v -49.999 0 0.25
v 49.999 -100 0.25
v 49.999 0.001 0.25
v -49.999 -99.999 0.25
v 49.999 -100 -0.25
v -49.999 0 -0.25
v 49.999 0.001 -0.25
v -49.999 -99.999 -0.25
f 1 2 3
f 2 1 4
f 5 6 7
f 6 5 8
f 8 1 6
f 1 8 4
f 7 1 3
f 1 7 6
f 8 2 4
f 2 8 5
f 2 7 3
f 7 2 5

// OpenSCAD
bend_ake630_radius = 0.0005;
bend_ake630_width = 0.630;
thickness = 0.001;

/// Rauminhalt, der mit der AKE 630 festgehalten wird.
/// Möglichst simpel.
module bend_ake630_clampspace()
{
	translate([-0.1, 0, 0])
	cube(size=[0.2, bend_ake630_width, 0.1], center=true);
};

module bend_ake630_clamp_bar()
{
	rotate(90, [1, 0, 0])
	linear_extrude(height=bend_ake630_width, center=true)
	polygon(
		points=[
			[-0.000, 0.000], // eigentliche biegekante
			[-0.005, 0.007], // kante nach der schräge
			[-0.010, 0.007], // bis zur schweißnaht
			[-0.043, 0.045], // kante hinten oben
			[-0.043, 0.000] // kante hinten unten
		],
		paths=[[0,1,2, 3, 4]]
	);
};

module bend_ake630_bed()
{
	translate([-0.044/2 -0.001, 0, -0.01/2])
	cube([0.044, bend_ake630_width, 0.01], center=true);
}

module bend_ake630_bender()
{
	translate([0.012/2, 0, -0.056/2])
	cube([0.012, bend_ake630_width, 0.056], center=true);
	translate([-0.021/2, 0, -0.010/2 -0.023])
	cube([0.021, bend_ake630_width, 0.010], center=true);
};

/// Externe Funktion
module bend_brake(
	angle_deg = 90,
	anim = 1.0,
	at = [0, 0, 0],
	rot = 0
)
{
	translate(at)
	translate([-0.0002, 0, 0])
	rotate(rot, [0, 0, 1])
	bend_brake_detail(
		angle_deg = angle_deg * max(0.0, min(1.0, anim)),
		angle = angle_deg * (3.1415/180) * max(0.0, min(1.0, anim)),
		display_brake = (anim > 0.0 && anim <= 1.0),
		t = thickness,
		r1 = bend_ake630_radius,
		r2 = bend_ake630_radius + thickness,
		w = bend_ake630_width
	) {
		rotate(rot, [0, 0, -1])
		// 0.0002: empirisch ermittelte Lage der Biegestelle.
		translate([0.0002, 0, 0])
		translate(-1*at)
		child(0);
		
		bend_ake630_clampspace();
	};
	
};

module bend_brake_detail(
	angle_deg, angle, display_brake, t, r1, r2
)
{
	// unbend part (x < 0)	
	intersection() {
		child(0);
		child(1);
	};


	// bend part (x > 0)
	translate([
		sin(angle_deg) * r2,
		0,
		r2 - r2 * cos(angle_deg)
	])
	rotate(a = angle_deg, v = [0, -1, 0])
	translate([-r2 * angle, 0, 0])
	difference() {
		child(0);
		translate([r2 * angle, 0, 0])
		child(1);
	};
	
	// round part (x ~= 0)
	//color([1, 0, 0.2])
	rotate(a = angle_deg/2, v = [0, -1, 0])
	scale([2*abs(sin(angle_deg/2))/(angle+0.001), 1, 1])
	intersection() {
		child(0);
		translate([0, -w/2, -r2])
		cube([ r2 * angle, w, 2 * r2]);
	};
	
	// Visualisation
	if(display_brake)
	color([0.41, 0.51, 0.36])
	{
		translate([0, 0, t])
		bend_ake630_clamp_bar();
		
		bend_ake630_bed();
		
		translate([r2, 0, 0])
		rotate(a = angle_deg, v = [0, -1, 0])
		bend_ake630_bender();
		
	};
};



scale([1000, 1000, 1000])
{

bend_brake(30, 4*$t -2.4, at=[0.0, 0, 0], rot=-15)
bend_brake(30, 4*$t -1.2, at=[0.0, 0, 0], rot=0)
bend_brake(30, 4*$t, at=[0.0, 0, 0], rot=15)
{
	translate([0, -0.05, 0])
	cube([0.1, 0.1, 0.0005], true);

};

} // resize;

//cube();
